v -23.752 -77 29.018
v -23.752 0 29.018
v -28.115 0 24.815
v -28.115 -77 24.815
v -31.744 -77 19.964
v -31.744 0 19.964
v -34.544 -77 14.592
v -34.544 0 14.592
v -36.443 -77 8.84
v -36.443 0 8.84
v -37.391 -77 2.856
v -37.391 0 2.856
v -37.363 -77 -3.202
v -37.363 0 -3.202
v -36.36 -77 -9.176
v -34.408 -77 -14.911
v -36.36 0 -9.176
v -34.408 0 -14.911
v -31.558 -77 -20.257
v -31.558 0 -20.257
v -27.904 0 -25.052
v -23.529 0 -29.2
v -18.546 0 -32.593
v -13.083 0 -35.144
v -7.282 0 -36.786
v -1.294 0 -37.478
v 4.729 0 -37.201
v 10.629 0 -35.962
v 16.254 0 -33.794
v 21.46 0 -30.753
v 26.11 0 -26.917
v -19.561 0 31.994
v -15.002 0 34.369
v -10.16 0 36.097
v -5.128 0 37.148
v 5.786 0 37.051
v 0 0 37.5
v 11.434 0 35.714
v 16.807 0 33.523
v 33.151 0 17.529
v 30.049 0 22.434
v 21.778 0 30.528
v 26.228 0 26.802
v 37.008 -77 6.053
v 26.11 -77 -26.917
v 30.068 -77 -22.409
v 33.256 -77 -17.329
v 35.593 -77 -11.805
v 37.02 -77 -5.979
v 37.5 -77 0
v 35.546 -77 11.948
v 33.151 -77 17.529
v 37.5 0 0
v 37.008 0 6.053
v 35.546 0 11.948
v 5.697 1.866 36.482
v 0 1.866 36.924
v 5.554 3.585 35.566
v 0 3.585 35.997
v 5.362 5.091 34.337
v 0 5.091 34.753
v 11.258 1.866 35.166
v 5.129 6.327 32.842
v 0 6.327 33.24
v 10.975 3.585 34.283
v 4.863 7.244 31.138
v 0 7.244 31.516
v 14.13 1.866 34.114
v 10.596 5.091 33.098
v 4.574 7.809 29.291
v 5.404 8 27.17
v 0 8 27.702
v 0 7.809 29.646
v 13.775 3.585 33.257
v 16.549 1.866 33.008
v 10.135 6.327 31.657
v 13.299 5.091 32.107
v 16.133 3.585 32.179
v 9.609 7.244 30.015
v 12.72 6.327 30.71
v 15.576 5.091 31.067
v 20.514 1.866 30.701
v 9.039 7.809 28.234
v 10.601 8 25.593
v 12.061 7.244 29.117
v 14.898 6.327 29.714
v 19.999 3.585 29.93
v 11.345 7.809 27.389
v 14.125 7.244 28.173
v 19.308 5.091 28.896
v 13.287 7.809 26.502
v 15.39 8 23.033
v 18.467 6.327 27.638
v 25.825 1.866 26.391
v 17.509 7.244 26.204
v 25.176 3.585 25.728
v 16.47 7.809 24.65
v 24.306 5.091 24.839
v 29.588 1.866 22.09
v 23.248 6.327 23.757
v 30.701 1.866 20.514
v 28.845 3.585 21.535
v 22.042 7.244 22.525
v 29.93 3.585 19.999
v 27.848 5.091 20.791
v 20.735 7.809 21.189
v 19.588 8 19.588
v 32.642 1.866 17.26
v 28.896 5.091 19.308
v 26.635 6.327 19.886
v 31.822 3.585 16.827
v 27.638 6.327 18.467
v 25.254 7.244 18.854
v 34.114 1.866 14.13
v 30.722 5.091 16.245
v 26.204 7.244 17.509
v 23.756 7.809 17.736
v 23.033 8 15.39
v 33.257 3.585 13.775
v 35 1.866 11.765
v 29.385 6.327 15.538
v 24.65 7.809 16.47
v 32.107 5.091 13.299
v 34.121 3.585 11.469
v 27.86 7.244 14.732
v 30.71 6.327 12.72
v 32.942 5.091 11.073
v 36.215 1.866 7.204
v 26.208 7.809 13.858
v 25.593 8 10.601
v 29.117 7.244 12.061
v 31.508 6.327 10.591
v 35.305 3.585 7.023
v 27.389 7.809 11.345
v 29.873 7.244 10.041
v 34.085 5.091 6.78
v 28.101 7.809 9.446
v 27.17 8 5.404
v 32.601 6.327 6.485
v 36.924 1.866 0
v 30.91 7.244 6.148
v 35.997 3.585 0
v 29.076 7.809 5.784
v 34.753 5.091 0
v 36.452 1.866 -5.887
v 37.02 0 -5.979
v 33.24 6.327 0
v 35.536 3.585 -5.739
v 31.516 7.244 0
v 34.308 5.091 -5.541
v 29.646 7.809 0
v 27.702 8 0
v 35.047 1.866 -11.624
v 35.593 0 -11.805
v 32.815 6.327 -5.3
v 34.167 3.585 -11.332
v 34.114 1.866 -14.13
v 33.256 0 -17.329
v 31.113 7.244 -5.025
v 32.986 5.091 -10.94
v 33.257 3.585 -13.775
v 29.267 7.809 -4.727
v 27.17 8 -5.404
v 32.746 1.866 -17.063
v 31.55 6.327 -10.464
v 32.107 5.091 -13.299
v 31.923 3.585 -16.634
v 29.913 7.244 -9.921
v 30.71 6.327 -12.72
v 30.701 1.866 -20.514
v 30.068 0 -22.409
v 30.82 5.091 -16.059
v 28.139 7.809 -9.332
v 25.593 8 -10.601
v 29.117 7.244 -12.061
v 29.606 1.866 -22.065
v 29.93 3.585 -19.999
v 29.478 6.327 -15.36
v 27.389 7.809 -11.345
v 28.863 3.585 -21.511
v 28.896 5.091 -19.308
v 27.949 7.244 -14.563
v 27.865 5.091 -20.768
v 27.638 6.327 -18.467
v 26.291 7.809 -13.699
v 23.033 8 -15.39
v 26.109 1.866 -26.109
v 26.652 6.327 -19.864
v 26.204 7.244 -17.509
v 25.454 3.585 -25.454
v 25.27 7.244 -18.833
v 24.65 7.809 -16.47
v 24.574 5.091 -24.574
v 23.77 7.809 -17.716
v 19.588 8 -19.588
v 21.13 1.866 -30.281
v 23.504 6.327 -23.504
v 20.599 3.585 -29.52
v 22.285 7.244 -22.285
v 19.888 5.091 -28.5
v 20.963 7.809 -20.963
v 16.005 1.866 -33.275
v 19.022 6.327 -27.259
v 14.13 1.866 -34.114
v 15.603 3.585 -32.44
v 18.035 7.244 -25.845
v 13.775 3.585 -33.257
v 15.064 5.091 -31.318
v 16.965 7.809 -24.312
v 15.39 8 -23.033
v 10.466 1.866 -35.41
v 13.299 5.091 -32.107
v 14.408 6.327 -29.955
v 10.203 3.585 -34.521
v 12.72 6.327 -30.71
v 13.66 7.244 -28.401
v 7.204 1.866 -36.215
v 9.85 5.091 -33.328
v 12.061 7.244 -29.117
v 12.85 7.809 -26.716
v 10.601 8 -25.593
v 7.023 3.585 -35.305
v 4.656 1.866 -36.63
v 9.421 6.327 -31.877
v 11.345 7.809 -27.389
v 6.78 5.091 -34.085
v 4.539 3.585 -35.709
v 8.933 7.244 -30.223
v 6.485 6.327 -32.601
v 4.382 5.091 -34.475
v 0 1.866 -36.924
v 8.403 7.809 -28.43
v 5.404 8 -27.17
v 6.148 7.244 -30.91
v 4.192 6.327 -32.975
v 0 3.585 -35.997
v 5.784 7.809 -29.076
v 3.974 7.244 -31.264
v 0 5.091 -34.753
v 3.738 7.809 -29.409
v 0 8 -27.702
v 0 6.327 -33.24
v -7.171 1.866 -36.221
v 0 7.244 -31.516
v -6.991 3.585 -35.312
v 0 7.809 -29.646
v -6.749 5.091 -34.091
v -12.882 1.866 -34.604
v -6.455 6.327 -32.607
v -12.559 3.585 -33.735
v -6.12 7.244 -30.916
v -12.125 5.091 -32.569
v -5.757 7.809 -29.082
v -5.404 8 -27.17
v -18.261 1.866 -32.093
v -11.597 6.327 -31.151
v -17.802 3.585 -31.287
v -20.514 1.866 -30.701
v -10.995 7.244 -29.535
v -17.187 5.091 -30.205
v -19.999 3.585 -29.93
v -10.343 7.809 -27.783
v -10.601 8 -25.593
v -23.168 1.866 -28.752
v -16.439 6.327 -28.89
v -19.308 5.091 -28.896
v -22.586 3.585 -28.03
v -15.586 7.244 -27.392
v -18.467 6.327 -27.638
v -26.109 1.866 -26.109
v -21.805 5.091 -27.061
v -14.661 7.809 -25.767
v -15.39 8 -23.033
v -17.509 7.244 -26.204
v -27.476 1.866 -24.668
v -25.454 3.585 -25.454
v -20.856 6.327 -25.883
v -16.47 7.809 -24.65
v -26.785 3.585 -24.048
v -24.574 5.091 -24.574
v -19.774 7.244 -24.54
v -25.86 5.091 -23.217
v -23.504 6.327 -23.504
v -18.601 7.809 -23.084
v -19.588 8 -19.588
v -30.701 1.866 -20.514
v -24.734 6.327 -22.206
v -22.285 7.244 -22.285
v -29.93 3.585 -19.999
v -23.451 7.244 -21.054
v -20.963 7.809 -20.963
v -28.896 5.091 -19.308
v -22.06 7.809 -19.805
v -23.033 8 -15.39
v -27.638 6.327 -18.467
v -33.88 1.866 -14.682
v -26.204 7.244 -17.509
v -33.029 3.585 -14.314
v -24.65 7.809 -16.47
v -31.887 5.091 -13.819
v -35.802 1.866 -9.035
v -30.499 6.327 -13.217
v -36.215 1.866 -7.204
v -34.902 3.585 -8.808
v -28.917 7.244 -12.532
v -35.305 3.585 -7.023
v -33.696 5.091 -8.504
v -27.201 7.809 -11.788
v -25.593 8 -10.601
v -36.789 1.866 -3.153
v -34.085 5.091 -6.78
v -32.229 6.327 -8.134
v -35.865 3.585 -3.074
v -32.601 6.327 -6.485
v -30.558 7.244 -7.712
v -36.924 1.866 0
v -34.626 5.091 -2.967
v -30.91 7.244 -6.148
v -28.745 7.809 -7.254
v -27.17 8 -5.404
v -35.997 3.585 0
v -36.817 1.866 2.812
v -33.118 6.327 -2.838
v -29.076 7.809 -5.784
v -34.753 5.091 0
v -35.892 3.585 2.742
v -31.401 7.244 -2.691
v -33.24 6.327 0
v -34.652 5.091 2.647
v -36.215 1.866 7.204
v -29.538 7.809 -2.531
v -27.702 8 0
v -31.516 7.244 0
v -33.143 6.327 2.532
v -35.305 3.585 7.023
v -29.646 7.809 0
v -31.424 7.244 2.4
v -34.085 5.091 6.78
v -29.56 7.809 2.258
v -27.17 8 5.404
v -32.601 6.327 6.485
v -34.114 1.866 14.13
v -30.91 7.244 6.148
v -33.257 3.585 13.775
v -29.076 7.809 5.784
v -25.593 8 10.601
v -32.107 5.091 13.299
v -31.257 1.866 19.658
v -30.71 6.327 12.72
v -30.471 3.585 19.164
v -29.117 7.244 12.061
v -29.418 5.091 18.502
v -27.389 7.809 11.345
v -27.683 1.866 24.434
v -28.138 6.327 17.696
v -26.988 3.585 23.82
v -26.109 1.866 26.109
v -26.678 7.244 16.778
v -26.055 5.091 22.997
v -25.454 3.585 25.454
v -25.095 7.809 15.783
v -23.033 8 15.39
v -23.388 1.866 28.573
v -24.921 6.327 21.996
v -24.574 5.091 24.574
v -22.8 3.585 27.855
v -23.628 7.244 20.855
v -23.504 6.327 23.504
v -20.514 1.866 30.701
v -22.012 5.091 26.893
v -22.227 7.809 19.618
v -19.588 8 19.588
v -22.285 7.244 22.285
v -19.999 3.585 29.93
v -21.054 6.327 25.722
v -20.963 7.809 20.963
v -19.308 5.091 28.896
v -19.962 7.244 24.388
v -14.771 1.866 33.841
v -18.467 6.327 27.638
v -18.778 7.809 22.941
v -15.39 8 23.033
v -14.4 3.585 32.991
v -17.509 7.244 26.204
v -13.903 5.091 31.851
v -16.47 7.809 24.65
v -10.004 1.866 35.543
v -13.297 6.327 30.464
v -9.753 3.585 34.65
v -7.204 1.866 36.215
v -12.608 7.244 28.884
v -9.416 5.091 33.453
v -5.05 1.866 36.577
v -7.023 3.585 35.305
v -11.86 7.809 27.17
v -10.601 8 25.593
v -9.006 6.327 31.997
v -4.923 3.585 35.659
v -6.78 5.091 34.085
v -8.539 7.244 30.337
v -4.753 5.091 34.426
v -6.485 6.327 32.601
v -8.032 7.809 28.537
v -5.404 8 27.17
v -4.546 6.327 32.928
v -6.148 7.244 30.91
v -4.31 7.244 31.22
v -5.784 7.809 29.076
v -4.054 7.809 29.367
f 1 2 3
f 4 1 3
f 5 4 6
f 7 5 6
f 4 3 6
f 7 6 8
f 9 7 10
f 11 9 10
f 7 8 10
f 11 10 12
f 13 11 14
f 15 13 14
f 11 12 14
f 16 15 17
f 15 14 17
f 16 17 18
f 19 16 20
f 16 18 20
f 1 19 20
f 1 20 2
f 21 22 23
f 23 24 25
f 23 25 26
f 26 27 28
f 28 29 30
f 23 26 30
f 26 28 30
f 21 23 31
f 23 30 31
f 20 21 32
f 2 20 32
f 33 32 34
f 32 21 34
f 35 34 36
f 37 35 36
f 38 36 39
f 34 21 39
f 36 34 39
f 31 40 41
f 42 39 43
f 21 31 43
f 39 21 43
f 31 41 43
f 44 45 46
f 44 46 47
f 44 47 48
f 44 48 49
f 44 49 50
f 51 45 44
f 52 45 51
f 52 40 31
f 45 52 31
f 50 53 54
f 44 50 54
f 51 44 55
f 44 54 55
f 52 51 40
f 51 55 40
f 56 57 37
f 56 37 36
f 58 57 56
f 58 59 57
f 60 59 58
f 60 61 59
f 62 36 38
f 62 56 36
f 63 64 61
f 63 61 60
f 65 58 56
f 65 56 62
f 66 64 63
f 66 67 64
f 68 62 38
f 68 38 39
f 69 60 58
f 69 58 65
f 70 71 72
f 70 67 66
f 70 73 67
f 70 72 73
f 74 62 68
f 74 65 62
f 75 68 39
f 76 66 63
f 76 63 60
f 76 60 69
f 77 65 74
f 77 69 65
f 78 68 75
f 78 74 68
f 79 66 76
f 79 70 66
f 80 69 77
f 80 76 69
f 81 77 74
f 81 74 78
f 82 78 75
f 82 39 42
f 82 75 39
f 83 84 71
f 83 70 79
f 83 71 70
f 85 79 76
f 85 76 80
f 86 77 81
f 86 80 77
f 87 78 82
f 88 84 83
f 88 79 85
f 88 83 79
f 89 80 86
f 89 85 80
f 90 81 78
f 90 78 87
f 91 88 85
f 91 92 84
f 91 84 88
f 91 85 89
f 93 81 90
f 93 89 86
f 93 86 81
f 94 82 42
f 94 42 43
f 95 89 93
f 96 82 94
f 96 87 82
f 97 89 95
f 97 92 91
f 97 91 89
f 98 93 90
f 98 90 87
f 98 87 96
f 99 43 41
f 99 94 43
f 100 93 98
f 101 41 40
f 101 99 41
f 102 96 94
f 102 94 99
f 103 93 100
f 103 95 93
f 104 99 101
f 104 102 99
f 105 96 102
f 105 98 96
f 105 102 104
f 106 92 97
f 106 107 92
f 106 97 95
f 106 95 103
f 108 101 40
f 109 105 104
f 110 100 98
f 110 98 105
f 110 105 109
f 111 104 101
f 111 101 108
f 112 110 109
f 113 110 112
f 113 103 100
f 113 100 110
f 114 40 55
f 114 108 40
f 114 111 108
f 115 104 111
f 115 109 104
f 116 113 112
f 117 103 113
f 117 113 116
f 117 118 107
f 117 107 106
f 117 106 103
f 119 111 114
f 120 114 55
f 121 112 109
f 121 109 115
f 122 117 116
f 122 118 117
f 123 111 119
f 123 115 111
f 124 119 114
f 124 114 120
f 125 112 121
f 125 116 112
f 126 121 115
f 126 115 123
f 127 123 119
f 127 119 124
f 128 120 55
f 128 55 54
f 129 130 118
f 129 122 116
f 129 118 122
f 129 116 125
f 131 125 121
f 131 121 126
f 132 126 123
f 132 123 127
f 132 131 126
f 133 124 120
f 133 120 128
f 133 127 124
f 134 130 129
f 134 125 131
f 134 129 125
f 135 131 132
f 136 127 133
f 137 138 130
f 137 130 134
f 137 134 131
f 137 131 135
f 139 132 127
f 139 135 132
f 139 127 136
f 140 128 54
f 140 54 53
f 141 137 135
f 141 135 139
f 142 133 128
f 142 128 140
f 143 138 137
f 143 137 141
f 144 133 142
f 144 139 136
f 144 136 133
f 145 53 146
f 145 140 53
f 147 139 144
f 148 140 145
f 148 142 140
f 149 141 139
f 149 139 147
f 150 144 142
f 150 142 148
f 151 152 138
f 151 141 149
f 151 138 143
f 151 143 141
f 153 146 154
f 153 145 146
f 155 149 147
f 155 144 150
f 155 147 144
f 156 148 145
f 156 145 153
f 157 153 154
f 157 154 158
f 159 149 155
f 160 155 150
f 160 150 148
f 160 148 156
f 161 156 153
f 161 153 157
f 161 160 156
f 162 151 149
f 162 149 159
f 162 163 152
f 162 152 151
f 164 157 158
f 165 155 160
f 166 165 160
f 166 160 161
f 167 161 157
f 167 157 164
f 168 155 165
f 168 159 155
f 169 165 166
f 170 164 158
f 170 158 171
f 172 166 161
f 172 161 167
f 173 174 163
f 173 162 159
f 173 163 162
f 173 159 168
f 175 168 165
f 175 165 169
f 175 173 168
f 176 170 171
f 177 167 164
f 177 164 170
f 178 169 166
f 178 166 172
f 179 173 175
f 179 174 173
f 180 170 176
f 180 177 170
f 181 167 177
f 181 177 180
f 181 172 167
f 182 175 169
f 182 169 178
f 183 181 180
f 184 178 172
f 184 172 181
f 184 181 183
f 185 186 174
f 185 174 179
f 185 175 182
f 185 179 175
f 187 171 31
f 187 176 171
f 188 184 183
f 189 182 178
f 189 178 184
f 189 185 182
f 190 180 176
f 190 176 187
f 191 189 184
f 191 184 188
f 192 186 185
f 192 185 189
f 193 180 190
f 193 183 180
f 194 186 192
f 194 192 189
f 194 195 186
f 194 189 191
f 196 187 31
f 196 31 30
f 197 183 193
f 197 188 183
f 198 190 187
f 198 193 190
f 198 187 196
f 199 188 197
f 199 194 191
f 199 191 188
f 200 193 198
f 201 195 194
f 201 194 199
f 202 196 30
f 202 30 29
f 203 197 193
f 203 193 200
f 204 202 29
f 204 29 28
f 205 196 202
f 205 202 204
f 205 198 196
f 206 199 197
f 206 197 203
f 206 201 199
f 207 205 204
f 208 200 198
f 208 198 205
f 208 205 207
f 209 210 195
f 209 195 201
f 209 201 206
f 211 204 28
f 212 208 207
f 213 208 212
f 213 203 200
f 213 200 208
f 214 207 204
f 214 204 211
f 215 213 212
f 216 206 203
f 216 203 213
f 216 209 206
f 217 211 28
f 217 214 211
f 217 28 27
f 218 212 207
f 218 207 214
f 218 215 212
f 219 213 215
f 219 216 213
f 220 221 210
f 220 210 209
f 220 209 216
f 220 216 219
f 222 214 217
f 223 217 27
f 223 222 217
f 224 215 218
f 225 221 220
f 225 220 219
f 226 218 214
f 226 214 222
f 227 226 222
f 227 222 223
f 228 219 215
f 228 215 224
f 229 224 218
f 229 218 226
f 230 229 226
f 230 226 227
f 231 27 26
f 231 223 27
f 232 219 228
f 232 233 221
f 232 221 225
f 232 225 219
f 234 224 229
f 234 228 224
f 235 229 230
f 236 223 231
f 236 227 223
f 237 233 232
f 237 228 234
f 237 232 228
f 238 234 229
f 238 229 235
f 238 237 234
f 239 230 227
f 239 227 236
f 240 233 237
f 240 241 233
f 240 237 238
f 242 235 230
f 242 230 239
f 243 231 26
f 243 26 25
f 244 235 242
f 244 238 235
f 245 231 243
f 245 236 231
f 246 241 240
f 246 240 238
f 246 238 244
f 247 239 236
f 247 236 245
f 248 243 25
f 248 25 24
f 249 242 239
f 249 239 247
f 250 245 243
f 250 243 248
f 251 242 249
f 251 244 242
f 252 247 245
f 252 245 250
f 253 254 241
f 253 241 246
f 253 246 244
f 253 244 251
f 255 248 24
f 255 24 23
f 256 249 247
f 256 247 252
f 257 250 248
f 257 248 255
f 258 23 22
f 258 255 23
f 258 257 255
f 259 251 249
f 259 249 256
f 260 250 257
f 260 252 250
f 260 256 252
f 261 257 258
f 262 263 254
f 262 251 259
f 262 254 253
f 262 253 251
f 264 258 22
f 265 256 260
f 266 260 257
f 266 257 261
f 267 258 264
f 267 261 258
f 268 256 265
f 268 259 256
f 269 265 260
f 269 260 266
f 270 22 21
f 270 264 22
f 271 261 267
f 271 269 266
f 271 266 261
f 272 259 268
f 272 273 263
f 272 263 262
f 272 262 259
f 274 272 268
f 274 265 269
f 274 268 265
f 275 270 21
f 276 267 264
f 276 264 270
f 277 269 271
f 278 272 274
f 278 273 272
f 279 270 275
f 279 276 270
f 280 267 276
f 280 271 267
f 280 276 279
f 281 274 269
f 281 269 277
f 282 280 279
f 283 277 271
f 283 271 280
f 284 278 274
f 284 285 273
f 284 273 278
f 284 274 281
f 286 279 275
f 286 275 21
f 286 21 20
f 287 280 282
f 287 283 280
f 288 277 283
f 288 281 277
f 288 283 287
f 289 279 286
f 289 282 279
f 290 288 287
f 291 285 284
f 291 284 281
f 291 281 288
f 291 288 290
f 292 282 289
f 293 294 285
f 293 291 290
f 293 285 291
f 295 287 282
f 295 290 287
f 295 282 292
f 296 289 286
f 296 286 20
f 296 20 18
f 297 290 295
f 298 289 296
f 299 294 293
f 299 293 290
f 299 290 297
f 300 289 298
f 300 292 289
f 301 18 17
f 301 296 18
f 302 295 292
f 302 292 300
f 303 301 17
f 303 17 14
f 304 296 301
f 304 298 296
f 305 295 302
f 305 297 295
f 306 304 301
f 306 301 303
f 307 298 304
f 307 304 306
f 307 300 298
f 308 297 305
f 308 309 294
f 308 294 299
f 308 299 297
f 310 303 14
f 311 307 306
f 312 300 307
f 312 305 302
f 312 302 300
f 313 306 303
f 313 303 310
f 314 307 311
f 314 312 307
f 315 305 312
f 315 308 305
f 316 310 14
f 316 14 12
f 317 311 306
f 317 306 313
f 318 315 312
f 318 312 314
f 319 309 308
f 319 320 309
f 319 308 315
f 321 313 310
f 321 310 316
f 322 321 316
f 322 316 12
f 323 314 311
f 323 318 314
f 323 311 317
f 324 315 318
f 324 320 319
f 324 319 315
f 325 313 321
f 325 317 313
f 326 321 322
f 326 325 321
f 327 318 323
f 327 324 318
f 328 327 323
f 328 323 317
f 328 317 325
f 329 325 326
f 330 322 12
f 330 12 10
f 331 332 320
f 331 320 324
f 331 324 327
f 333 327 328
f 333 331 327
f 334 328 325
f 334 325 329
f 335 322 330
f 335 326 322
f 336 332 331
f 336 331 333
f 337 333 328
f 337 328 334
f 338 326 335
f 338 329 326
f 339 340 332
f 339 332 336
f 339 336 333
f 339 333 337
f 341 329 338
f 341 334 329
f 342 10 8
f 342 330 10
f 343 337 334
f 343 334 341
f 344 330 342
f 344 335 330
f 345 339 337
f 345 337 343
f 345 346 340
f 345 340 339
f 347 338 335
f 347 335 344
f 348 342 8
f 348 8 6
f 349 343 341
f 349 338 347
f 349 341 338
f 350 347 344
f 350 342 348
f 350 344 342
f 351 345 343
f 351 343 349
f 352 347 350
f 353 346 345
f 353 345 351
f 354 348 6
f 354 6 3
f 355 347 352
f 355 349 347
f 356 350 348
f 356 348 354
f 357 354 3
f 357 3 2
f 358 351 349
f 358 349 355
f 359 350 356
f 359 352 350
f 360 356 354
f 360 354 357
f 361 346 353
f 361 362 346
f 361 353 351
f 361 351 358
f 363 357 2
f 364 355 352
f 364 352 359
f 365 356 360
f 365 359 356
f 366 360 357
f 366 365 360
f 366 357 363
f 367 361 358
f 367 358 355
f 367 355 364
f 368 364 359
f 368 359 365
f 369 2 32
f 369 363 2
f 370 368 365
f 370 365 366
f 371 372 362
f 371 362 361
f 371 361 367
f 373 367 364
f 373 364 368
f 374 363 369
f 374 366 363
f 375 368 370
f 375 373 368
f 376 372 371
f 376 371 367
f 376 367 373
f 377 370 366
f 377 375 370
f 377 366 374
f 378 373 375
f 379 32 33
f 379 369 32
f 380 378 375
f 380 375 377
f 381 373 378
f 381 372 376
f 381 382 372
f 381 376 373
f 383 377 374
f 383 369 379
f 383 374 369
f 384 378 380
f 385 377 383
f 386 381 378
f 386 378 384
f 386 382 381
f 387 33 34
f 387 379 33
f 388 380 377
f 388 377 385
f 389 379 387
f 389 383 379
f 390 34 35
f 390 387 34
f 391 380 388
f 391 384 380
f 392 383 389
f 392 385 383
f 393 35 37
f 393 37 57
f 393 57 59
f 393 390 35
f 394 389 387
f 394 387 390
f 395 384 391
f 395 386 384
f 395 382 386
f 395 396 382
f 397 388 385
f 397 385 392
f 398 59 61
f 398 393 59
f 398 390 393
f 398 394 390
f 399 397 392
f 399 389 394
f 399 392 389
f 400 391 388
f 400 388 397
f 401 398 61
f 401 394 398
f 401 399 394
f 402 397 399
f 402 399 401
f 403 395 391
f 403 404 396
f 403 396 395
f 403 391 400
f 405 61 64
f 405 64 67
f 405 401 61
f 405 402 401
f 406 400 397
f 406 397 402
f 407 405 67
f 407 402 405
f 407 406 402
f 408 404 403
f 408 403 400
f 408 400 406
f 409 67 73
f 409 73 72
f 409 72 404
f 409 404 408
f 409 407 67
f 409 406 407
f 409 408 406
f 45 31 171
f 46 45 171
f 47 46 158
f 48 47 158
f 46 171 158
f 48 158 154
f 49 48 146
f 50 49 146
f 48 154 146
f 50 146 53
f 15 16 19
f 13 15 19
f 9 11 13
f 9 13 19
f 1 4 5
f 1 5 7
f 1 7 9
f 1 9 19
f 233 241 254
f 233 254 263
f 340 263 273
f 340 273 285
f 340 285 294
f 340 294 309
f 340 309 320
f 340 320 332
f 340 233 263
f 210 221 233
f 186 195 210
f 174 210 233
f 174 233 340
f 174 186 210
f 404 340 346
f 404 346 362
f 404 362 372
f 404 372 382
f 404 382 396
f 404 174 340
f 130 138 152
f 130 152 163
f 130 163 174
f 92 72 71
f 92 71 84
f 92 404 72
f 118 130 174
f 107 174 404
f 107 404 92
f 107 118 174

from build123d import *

# Parameters (mm, degrees)
SKETCH1_R           = 37.5
BOSS_EXTRUDE1_DEPTH = 8
FILLET1_R           = 10
BOSS_EXTRUDE3_DEPTH = 77


with BuildPart() as part:
    # Sketch1 → Boss-Extrude1 (new body)
    with BuildSketch(Plane(origin=(0, 0, 0), x_dir=(1, 0, 0), z_dir=(0, 1, 0))):
        with Locations(Location((0, 0, 0), (0, 0, 270))):
            Circle(SKETCH1_R)
    extrude(amount=BOSS_EXTRUDE1_DEPTH)

    # Fillet1
    # the kernel refuses this fillet: 10 mm, written as the material it takes off along each edge
    with BuildSketch(Plane(origin=(0, 8, 0), x_dir=(0, 0, 1), z_dir=(-1, 0, 0))) as fillet1_piece_1:
        with BuildLine():
            CenterArc((27.702041029, -10), FILLET1_R, 11.536959033, 78.463040967)
            Line((27.702041029, 0), (27.702041029, 0.2))
            Line((27.702041029, 0.2), (37.5, 0.2))
            Line((37.5, 0.2), (37.7, 0))
            ThreePointArc((37.7, 0), (37.7, -4), (37.695959179, -7.96))
            Line((37.695959179, -7.96), (37.5, -8))
        make_face()
    revolve(axis=Axis((0, 8, 0), (0, 1, 0)), mode=Mode.SUBTRACT)

    # Sketch3 → Boss-Extrude3 (add)
    with BuildSketch(Plane.XZ):
        with BuildLine():
            Line((-31.557930538, -20.257023971), (-23.752439757, 29.018470077))
            ThreePointArc((-23.752439757, 29.018470077), (-37.038194394, 5.867039803), (-31.557930538, -20.257023971))
        make_face()
        with BuildLine():
            ThreePointArc((37.5, 0), (36.396457433, 9.03038683), (33.150779397, 17.529284794))
            Line((33.150779397, 17.529284794), (26.110331633, -26.916548479))
            ThreePointArc((26.110331633, -26.916548479), (34.535398045, -14.613564996), (37.5, 0))
        make_face()
    extrude(amount=BOSS_EXTRUDE3_DEPTH)


solid = part.part
